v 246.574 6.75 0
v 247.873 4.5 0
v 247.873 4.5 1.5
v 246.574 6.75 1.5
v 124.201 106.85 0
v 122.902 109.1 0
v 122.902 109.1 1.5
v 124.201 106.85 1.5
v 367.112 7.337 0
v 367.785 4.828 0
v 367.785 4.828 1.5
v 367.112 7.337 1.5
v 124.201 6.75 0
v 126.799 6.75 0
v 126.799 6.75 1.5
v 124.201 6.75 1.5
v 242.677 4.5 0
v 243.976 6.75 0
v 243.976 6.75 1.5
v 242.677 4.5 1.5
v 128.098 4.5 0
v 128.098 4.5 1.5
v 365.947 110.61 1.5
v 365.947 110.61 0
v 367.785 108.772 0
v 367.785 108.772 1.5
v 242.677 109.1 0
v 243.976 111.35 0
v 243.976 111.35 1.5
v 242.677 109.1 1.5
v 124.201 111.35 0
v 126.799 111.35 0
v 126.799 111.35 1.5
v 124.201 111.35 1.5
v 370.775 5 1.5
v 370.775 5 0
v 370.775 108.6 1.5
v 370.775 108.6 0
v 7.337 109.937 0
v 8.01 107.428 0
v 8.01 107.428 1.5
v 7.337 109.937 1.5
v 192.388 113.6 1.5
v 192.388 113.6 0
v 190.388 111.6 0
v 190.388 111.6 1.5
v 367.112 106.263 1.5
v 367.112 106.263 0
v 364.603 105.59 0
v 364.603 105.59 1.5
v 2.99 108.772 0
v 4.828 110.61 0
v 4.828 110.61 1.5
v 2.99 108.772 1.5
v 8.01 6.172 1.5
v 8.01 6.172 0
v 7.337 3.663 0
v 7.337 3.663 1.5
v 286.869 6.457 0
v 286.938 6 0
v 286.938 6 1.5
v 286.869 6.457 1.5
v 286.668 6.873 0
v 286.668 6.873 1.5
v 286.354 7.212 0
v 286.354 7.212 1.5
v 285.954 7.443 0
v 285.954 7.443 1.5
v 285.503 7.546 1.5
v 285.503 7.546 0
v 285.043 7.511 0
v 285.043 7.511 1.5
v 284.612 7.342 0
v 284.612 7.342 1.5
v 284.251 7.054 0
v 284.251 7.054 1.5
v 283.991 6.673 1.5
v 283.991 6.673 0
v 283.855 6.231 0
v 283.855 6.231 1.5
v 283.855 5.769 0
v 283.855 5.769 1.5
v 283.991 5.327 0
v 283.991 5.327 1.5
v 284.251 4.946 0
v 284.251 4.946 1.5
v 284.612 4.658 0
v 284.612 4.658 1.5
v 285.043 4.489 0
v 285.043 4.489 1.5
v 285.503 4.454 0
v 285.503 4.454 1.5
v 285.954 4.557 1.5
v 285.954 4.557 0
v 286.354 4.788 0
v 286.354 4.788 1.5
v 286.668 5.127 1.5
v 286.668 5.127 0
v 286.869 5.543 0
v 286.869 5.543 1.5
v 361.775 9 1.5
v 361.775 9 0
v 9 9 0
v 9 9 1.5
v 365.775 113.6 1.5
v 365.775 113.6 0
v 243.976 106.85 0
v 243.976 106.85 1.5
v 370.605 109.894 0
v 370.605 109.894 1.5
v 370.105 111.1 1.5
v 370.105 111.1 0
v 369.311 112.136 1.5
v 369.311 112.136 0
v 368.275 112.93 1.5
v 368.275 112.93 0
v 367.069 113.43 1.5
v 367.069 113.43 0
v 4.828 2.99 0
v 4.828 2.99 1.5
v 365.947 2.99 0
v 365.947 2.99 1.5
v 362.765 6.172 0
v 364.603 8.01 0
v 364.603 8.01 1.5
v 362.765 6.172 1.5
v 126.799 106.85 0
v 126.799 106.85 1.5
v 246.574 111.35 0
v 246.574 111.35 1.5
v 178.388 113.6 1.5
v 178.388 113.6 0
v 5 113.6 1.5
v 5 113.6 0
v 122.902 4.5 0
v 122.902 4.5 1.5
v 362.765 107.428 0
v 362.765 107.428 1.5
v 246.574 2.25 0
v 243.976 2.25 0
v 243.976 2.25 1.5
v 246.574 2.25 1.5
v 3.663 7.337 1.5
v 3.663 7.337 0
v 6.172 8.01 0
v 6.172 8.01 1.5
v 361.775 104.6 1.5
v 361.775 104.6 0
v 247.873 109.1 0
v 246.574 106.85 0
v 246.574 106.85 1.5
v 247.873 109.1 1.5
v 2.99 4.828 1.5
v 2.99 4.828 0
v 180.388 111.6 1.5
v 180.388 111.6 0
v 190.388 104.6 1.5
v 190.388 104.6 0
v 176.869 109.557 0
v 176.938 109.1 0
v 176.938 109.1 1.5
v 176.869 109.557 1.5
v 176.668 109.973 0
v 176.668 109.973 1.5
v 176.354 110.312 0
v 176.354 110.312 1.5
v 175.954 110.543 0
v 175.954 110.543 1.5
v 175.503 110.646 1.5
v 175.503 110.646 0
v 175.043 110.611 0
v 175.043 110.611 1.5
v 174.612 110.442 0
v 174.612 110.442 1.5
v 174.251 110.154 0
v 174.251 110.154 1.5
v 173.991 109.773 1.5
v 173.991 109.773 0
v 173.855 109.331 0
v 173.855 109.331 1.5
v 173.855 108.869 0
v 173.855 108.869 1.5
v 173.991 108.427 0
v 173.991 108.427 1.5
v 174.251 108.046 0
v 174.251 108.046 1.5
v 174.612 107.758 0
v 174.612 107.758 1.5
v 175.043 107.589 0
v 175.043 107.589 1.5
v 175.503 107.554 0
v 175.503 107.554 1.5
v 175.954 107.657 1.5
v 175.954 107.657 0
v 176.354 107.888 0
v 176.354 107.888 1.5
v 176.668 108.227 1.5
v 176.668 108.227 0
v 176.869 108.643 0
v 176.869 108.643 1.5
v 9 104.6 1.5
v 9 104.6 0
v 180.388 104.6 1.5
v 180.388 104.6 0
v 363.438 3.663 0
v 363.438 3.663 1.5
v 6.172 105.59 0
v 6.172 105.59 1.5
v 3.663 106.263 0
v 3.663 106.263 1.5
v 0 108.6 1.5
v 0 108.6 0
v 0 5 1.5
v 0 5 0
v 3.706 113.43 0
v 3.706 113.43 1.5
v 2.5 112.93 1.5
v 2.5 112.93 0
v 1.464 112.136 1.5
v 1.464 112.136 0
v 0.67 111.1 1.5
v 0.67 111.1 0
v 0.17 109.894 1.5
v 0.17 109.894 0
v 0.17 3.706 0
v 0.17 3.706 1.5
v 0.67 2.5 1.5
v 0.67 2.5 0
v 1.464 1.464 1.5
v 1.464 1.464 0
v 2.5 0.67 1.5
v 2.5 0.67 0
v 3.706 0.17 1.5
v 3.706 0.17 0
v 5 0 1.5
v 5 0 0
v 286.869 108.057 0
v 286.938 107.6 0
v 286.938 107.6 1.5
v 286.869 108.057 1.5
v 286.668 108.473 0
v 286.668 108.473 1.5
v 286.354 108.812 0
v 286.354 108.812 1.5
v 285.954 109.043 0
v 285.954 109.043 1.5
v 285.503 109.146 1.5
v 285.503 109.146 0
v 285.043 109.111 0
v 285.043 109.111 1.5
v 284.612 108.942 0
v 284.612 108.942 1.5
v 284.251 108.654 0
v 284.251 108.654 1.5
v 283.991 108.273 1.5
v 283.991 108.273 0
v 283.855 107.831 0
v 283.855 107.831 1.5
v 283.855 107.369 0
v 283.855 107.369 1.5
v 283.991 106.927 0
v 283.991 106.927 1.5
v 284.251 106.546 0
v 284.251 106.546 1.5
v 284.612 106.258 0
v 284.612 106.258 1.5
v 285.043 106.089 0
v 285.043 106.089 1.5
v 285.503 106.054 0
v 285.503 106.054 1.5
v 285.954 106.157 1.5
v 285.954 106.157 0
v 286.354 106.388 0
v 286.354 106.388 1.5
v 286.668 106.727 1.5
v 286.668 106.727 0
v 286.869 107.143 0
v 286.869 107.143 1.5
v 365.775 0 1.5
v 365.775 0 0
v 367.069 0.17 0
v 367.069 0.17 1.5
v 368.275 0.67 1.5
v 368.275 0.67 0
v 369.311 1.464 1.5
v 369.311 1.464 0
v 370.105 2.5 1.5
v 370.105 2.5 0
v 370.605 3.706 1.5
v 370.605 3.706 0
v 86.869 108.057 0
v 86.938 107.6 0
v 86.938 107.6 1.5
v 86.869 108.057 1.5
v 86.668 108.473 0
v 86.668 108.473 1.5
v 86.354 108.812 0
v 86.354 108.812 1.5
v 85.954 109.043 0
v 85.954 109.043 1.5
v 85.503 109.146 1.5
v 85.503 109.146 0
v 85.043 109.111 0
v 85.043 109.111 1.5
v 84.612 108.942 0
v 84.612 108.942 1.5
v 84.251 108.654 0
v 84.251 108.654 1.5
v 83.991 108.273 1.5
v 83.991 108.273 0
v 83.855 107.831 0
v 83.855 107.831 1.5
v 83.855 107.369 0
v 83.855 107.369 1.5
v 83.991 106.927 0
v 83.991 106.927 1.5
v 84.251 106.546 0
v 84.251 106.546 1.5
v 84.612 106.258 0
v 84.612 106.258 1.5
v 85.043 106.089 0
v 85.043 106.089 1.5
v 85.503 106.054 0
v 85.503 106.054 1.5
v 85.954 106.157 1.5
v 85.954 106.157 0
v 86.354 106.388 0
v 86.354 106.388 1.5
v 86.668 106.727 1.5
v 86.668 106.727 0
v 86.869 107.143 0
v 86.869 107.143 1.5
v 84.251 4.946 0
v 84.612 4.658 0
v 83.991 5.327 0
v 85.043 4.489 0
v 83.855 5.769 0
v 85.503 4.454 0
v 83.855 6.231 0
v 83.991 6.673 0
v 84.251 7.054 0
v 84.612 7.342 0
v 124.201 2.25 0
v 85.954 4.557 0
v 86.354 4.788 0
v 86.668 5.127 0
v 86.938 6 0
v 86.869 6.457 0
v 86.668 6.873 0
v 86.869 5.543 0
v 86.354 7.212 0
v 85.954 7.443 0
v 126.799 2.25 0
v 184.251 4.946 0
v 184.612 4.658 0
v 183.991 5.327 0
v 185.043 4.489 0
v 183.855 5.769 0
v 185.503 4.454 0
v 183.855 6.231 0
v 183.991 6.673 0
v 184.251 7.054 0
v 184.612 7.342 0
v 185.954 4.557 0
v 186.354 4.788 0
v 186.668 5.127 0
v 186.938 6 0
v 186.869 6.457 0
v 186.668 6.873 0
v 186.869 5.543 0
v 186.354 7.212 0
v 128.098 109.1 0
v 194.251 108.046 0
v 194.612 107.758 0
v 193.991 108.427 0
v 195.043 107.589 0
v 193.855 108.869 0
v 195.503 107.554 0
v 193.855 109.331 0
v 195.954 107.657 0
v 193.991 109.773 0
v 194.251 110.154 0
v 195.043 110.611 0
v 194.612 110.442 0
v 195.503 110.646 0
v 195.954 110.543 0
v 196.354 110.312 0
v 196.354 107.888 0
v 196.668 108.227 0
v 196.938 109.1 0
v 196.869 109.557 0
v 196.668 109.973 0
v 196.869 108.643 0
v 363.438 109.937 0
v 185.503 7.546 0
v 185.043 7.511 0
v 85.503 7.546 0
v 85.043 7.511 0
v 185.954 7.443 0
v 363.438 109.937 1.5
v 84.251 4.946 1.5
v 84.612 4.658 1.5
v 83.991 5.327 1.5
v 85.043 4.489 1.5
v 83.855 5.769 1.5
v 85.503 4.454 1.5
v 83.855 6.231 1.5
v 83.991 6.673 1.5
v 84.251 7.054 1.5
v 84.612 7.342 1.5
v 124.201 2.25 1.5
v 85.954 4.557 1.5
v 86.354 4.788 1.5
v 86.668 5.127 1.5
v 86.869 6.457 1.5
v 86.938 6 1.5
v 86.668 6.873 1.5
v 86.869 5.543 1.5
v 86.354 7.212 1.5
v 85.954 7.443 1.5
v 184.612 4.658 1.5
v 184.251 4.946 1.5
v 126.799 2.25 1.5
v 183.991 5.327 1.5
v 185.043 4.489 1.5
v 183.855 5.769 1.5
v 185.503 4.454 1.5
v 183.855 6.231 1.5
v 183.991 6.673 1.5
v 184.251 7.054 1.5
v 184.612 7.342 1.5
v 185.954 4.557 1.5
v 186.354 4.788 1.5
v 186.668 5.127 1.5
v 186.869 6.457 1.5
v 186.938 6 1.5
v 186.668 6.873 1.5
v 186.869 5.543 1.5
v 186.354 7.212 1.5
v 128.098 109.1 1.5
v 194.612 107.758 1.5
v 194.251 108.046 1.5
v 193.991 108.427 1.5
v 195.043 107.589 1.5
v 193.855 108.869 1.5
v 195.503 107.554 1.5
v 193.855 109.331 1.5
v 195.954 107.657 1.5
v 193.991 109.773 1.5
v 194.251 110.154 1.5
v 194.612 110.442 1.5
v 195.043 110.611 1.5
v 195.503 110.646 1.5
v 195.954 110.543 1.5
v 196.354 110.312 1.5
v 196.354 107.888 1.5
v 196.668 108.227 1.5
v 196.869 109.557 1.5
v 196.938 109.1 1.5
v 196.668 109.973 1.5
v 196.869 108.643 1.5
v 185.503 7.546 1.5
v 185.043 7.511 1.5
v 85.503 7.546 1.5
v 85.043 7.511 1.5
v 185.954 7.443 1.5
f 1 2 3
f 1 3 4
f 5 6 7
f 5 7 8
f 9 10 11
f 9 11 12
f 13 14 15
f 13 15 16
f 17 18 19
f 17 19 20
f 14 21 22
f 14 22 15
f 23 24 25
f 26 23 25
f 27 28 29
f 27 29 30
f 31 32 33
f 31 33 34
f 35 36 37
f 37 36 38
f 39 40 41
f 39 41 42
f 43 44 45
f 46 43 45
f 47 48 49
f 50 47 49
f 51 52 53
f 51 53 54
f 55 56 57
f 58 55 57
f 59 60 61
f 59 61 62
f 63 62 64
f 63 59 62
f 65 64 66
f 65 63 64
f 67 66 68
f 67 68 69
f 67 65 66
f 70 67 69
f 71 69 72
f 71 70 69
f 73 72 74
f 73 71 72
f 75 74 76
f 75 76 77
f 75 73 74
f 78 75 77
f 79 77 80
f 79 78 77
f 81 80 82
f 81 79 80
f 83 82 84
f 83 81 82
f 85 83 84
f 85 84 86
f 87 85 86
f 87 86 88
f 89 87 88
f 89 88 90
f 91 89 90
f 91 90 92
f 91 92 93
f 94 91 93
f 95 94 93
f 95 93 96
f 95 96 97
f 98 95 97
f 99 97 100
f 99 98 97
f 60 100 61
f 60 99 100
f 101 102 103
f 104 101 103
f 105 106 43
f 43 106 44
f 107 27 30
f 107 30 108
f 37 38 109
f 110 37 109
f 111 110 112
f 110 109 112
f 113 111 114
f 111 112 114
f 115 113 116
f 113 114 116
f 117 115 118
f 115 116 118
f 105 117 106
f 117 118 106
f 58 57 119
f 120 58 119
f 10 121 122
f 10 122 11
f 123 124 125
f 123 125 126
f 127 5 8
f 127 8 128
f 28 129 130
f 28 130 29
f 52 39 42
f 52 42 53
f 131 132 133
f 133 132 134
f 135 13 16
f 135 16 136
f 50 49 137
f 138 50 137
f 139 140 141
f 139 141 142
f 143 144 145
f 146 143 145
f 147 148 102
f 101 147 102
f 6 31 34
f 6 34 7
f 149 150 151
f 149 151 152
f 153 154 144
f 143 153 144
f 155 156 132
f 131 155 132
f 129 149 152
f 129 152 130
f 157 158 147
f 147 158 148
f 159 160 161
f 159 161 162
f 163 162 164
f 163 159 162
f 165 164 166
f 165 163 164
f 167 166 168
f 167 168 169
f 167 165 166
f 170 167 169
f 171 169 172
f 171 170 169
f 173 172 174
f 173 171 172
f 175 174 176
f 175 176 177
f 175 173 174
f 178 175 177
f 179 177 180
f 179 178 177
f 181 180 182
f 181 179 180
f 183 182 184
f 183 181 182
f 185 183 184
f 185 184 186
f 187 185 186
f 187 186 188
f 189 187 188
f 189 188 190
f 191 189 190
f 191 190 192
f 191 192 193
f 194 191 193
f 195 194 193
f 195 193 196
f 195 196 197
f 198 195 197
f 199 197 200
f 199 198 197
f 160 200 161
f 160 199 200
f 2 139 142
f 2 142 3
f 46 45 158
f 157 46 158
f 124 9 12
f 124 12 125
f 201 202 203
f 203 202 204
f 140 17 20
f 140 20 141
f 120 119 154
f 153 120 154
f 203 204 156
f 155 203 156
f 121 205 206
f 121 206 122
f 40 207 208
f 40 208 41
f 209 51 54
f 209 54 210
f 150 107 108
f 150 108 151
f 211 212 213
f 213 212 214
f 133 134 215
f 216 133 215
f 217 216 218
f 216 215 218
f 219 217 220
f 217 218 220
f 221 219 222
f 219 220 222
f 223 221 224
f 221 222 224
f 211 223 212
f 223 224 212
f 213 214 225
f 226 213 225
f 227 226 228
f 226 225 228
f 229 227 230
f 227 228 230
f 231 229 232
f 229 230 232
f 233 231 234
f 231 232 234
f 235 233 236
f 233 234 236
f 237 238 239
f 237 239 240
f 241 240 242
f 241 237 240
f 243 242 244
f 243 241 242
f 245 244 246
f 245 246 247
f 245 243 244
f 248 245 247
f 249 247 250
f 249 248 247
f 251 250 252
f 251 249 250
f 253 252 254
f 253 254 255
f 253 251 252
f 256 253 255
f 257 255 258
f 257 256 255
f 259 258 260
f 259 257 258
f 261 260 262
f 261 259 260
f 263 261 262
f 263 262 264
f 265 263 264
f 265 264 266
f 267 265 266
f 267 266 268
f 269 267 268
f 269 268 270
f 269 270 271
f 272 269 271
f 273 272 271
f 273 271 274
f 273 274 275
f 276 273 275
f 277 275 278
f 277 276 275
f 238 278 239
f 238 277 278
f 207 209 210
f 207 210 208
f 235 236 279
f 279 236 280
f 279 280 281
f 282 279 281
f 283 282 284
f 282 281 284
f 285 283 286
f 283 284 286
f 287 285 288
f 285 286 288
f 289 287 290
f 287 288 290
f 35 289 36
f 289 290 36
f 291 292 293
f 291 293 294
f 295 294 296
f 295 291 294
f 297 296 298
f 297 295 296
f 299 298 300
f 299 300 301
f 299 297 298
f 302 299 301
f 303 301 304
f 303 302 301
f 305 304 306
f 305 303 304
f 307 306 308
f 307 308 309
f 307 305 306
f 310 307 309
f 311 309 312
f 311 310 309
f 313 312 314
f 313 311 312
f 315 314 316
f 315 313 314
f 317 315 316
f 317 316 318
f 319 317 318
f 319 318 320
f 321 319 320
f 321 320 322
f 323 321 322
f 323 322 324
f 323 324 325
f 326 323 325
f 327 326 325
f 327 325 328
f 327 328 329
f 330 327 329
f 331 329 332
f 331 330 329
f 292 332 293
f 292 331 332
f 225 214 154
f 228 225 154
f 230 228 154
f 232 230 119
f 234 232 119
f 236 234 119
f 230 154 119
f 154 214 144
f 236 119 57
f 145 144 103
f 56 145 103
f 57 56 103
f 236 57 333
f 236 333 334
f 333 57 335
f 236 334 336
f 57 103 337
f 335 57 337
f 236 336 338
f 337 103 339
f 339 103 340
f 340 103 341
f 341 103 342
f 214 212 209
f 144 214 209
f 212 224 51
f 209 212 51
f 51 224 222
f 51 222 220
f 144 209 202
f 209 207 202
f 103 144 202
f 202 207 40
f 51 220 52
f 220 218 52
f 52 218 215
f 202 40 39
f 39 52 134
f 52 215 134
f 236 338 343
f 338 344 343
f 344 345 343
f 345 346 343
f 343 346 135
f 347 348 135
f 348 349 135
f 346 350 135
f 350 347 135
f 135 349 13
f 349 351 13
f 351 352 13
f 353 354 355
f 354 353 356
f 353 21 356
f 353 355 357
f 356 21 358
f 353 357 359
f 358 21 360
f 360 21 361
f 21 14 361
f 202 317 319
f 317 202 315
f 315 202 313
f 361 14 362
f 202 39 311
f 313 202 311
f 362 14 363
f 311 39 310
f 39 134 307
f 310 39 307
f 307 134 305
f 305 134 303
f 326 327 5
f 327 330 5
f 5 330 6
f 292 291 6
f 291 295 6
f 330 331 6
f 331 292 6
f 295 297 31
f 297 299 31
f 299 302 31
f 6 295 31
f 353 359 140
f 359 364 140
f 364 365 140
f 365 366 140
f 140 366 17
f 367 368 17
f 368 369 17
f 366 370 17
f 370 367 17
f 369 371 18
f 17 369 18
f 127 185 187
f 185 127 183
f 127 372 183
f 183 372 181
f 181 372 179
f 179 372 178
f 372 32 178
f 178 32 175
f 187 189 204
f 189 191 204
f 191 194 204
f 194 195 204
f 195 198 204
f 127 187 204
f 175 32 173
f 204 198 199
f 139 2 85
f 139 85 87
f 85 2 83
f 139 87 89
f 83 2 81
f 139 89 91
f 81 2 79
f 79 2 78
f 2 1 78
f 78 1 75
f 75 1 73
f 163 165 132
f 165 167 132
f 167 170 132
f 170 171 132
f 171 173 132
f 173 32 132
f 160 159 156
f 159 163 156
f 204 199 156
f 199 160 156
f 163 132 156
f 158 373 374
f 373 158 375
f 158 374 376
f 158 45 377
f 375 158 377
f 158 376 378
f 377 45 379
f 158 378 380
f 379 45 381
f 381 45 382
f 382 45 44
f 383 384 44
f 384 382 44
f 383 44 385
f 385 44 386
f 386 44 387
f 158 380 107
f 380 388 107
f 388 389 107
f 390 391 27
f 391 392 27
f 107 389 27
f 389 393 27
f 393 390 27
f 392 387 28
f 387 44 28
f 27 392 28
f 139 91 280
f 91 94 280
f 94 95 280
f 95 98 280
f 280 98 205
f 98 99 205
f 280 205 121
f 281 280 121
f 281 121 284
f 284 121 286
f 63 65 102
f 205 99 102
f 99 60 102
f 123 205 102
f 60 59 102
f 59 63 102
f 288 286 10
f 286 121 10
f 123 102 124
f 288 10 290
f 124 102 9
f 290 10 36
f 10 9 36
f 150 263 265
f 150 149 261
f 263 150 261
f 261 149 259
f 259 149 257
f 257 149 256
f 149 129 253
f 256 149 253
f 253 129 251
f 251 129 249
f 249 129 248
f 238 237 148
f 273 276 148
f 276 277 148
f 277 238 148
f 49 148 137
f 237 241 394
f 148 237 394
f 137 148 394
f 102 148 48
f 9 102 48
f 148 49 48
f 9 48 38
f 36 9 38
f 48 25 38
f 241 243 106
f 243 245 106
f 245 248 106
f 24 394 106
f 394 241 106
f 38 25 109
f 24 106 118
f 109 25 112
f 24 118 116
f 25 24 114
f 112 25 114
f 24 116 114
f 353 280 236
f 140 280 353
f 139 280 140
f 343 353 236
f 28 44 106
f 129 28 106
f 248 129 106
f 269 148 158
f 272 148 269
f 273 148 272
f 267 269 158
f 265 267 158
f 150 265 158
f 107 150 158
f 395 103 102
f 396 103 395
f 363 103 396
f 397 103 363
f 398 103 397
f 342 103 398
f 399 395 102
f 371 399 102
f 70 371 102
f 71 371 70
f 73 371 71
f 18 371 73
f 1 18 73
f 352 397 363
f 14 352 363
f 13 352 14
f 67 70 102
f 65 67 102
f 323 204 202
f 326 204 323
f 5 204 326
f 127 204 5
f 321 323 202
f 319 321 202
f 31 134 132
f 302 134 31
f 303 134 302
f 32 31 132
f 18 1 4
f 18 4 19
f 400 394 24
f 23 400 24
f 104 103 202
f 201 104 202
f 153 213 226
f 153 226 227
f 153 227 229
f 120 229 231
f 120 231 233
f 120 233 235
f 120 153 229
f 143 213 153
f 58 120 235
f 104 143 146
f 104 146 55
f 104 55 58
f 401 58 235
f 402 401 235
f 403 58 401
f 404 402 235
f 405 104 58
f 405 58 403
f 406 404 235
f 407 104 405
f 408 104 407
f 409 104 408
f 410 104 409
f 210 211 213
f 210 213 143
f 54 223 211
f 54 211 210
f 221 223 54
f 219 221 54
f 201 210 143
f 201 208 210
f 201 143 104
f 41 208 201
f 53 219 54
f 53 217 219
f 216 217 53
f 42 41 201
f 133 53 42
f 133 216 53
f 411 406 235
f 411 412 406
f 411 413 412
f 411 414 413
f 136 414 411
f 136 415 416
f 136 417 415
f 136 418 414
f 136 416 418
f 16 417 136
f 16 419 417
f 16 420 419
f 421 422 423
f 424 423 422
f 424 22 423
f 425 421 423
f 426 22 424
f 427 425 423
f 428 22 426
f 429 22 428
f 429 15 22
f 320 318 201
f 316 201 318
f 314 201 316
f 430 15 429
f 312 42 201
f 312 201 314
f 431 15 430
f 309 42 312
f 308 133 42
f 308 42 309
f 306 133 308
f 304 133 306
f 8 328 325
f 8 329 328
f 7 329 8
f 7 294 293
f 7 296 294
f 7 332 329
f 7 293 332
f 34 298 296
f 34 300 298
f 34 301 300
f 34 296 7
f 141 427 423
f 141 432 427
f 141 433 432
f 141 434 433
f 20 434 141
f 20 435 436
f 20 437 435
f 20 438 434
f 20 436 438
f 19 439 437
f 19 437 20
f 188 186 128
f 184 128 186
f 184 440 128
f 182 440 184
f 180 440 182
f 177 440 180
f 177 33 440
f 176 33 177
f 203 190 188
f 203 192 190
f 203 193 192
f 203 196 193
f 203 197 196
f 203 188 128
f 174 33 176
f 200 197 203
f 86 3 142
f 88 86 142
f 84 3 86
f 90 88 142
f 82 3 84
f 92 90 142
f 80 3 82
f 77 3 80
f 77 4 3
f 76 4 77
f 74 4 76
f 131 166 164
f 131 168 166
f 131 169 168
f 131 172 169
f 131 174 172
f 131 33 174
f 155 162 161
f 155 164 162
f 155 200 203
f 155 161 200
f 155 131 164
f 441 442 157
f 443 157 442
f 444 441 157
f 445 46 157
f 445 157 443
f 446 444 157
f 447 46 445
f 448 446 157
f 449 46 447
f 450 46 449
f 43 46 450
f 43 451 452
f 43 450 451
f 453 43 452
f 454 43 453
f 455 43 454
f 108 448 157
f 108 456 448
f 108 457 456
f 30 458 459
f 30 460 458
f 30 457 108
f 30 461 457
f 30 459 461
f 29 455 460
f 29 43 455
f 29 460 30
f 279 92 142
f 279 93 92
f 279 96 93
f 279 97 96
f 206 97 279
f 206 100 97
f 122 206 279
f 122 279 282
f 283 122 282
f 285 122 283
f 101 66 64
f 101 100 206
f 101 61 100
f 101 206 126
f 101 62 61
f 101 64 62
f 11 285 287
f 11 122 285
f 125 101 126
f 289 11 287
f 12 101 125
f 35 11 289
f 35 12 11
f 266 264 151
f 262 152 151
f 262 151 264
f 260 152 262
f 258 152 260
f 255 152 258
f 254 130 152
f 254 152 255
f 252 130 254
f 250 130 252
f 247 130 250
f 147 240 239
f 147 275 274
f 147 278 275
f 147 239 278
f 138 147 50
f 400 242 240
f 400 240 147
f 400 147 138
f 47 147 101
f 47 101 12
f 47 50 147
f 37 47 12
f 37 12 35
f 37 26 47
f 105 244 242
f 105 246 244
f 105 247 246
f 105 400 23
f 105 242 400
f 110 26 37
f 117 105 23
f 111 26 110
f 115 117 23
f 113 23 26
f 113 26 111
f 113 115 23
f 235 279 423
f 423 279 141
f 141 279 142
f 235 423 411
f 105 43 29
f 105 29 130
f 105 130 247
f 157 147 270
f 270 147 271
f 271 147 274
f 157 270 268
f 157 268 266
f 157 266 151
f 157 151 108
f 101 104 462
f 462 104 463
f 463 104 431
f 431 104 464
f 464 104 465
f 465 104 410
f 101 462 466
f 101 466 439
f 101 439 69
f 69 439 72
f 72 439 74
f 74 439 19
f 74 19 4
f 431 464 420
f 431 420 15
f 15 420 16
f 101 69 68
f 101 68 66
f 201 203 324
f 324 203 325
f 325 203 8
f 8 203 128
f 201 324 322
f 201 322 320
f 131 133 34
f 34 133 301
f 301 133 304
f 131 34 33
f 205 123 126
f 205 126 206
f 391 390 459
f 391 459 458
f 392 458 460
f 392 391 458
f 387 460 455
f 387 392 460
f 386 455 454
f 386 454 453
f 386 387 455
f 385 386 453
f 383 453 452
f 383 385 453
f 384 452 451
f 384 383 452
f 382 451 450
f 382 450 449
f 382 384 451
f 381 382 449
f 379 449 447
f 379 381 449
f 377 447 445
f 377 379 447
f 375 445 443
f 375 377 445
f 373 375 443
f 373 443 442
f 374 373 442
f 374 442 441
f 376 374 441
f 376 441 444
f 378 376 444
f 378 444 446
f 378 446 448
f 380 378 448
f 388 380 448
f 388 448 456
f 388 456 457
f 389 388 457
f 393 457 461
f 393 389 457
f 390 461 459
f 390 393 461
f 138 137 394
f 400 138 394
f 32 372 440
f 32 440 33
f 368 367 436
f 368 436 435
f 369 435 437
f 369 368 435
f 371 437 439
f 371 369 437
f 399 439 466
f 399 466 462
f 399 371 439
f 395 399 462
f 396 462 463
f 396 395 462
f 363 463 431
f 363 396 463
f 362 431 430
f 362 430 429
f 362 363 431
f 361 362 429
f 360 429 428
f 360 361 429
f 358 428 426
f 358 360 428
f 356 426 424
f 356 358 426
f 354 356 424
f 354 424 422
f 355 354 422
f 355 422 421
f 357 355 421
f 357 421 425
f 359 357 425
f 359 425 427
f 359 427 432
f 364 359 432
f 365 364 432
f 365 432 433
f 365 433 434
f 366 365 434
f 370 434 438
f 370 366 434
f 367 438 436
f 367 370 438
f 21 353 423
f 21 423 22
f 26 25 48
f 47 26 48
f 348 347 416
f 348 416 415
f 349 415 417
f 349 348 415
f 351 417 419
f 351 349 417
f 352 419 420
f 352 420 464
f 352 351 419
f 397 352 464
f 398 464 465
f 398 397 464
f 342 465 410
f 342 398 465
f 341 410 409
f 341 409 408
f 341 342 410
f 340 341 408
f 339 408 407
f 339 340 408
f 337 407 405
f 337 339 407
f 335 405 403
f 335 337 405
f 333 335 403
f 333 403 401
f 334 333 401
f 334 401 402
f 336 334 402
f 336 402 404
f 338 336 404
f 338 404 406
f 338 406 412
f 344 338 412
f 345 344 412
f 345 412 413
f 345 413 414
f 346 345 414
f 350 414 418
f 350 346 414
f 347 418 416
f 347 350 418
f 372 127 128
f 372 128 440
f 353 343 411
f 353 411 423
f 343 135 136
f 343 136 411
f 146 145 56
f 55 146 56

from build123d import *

# Parameters (mm, degrees)
MODEL_R             = 1.55
BOSS_EXTRUDE1_DEPTH = 1.5


with BuildPart() as part:
    # Model → Boss-Extrude1 (new body)
    with BuildSketch(Plane.XY):
        with BuildLine():
            Line((0, 108.6), (0, 5))
            ThreePointArc((0, 5), (1.464466094, 1.464466094), (5, 0))
            Line((5, 0), (365.775, 0))
            ThreePointArc((365.775, 0), (369.310533906, 1.464466094), (370.775, 5))
            Line((370.775, 5), (370.775, 108.6))
            ThreePointArc((370.775, 108.6), (369.310533906, 112.135533906), (365.775, 113.6))
            Line((365.775, 113.6), (192.3875, 113.6))
            Line((192.3875, 113.6), (190.3875, 111.6))
            Line((190.3875, 111.6), (190.3875, 104.6))
            Line((190.3875, 104.6), (361.775, 104.6))
            Line((361.775, 104.6), (361.775, 9))
            Line((361.775, 9), (9, 9))
            Line((9, 9), (9, 104.6))
            Line((9, 104.6), (180.3875, 104.6))
            Line((180.3875, 104.6), (180.3875, 111.6))
            Line((180.3875, 111.6), (178.3875, 113.6))
            Line((178.3875, 113.6), (5, 113.6))
            ThreePointArc((5, 113.6), (1.464466094, 112.135533906), (0, 108.6))
        make_face()
        with Locations((195.3875, 109.1)):
            Circle(MODEL_R, mode=Mode.SUBTRACT)
        with Locations((175.3875, 109.1)):
            Circle(MODEL_R, mode=Mode.SUBTRACT)
        with Locations((85.3875, 107.6)):
            Circle(MODEL_R, mode=Mode.SUBTRACT)
        with Locations((285.3875, 107.6)):
            Circle(MODEL_R, mode=Mode.SUBTRACT)
        with Locations((85.3875, 6)):
            Circle(MODEL_R, mode=Mode.SUBTRACT)
        with Locations((185.3875, 6)):
            Circle(MODEL_R, mode=Mode.SUBTRACT)
        with Locations((285.3875, 6)):
            Circle(MODEL_R, mode=Mode.SUBTRACT)
        Polygon((365.947431604, 110.609548911), (367.784548911, 108.772431604), (367.112117307, 106.262882693), (364.602568396, 105.590451089), (362.765451089, 107.427568396), (363.437882693, 109.937117307), align=None, mode=Mode.SUBTRACT)
        Polygon((4.827568396, 110.609548911), (2.990451089, 108.772431604), (3.662882693, 106.262882693), (6.172431604, 105.590451089), (8.009548911, 107.427568396), (7.337117307, 109.937117307), align=None, mode=Mode.SUBTRACT)
        Polygon((365.947431604, 2.990451089), (367.784548911, 4.827568396), (367.112117307, 7.337117307), (364.602568396, 8.009548911), (362.765451089, 6.172431604), (363.437882693, 3.662882693), align=None, mode=Mode.SUBTRACT)
        Polygon((4.827568396, 2.990451089), (2.990451089, 4.827568396), (3.662882693, 7.337117307), (6.172431604, 8.009548911), (8.009548911, 6.172431604), (7.337117307, 3.662882693), align=None, mode=Mode.SUBTRACT)
        Polygon((243.975961894, 2.25), (246.574038106, 2.25), (247.873076211, 4.5), (246.574038106, 6.75), (243.975961894, 6.75), (242.676923789, 4.5), align=None, mode=Mode.SUBTRACT)
        Polygon((243.975961894, 106.85), (246.574038106, 106.85), (247.873076211, 109.1), (246.574038106, 111.35), (243.975961894, 111.35), (242.676923789, 109.1), align=None, mode=Mode.SUBTRACT)
        Polygon((124.200961894, 106.85), (126.799038106, 106.85), (128.098076211, 109.1), (126.799038106, 111.35), (124.200961894, 111.35), (122.901923789, 109.1), align=None, mode=Mode.SUBTRACT)
        Polygon((124.200961894, 2.25), (126.799038106, 2.25), (128.098076211, 4.5), (126.799038106, 6.75), (124.200961894, 6.75), (122.901923789, 4.5), align=None, mode=Mode.SUBTRACT)
    extrude(amount=BOSS_EXTRUDE1_DEPTH)


solid = part.part
